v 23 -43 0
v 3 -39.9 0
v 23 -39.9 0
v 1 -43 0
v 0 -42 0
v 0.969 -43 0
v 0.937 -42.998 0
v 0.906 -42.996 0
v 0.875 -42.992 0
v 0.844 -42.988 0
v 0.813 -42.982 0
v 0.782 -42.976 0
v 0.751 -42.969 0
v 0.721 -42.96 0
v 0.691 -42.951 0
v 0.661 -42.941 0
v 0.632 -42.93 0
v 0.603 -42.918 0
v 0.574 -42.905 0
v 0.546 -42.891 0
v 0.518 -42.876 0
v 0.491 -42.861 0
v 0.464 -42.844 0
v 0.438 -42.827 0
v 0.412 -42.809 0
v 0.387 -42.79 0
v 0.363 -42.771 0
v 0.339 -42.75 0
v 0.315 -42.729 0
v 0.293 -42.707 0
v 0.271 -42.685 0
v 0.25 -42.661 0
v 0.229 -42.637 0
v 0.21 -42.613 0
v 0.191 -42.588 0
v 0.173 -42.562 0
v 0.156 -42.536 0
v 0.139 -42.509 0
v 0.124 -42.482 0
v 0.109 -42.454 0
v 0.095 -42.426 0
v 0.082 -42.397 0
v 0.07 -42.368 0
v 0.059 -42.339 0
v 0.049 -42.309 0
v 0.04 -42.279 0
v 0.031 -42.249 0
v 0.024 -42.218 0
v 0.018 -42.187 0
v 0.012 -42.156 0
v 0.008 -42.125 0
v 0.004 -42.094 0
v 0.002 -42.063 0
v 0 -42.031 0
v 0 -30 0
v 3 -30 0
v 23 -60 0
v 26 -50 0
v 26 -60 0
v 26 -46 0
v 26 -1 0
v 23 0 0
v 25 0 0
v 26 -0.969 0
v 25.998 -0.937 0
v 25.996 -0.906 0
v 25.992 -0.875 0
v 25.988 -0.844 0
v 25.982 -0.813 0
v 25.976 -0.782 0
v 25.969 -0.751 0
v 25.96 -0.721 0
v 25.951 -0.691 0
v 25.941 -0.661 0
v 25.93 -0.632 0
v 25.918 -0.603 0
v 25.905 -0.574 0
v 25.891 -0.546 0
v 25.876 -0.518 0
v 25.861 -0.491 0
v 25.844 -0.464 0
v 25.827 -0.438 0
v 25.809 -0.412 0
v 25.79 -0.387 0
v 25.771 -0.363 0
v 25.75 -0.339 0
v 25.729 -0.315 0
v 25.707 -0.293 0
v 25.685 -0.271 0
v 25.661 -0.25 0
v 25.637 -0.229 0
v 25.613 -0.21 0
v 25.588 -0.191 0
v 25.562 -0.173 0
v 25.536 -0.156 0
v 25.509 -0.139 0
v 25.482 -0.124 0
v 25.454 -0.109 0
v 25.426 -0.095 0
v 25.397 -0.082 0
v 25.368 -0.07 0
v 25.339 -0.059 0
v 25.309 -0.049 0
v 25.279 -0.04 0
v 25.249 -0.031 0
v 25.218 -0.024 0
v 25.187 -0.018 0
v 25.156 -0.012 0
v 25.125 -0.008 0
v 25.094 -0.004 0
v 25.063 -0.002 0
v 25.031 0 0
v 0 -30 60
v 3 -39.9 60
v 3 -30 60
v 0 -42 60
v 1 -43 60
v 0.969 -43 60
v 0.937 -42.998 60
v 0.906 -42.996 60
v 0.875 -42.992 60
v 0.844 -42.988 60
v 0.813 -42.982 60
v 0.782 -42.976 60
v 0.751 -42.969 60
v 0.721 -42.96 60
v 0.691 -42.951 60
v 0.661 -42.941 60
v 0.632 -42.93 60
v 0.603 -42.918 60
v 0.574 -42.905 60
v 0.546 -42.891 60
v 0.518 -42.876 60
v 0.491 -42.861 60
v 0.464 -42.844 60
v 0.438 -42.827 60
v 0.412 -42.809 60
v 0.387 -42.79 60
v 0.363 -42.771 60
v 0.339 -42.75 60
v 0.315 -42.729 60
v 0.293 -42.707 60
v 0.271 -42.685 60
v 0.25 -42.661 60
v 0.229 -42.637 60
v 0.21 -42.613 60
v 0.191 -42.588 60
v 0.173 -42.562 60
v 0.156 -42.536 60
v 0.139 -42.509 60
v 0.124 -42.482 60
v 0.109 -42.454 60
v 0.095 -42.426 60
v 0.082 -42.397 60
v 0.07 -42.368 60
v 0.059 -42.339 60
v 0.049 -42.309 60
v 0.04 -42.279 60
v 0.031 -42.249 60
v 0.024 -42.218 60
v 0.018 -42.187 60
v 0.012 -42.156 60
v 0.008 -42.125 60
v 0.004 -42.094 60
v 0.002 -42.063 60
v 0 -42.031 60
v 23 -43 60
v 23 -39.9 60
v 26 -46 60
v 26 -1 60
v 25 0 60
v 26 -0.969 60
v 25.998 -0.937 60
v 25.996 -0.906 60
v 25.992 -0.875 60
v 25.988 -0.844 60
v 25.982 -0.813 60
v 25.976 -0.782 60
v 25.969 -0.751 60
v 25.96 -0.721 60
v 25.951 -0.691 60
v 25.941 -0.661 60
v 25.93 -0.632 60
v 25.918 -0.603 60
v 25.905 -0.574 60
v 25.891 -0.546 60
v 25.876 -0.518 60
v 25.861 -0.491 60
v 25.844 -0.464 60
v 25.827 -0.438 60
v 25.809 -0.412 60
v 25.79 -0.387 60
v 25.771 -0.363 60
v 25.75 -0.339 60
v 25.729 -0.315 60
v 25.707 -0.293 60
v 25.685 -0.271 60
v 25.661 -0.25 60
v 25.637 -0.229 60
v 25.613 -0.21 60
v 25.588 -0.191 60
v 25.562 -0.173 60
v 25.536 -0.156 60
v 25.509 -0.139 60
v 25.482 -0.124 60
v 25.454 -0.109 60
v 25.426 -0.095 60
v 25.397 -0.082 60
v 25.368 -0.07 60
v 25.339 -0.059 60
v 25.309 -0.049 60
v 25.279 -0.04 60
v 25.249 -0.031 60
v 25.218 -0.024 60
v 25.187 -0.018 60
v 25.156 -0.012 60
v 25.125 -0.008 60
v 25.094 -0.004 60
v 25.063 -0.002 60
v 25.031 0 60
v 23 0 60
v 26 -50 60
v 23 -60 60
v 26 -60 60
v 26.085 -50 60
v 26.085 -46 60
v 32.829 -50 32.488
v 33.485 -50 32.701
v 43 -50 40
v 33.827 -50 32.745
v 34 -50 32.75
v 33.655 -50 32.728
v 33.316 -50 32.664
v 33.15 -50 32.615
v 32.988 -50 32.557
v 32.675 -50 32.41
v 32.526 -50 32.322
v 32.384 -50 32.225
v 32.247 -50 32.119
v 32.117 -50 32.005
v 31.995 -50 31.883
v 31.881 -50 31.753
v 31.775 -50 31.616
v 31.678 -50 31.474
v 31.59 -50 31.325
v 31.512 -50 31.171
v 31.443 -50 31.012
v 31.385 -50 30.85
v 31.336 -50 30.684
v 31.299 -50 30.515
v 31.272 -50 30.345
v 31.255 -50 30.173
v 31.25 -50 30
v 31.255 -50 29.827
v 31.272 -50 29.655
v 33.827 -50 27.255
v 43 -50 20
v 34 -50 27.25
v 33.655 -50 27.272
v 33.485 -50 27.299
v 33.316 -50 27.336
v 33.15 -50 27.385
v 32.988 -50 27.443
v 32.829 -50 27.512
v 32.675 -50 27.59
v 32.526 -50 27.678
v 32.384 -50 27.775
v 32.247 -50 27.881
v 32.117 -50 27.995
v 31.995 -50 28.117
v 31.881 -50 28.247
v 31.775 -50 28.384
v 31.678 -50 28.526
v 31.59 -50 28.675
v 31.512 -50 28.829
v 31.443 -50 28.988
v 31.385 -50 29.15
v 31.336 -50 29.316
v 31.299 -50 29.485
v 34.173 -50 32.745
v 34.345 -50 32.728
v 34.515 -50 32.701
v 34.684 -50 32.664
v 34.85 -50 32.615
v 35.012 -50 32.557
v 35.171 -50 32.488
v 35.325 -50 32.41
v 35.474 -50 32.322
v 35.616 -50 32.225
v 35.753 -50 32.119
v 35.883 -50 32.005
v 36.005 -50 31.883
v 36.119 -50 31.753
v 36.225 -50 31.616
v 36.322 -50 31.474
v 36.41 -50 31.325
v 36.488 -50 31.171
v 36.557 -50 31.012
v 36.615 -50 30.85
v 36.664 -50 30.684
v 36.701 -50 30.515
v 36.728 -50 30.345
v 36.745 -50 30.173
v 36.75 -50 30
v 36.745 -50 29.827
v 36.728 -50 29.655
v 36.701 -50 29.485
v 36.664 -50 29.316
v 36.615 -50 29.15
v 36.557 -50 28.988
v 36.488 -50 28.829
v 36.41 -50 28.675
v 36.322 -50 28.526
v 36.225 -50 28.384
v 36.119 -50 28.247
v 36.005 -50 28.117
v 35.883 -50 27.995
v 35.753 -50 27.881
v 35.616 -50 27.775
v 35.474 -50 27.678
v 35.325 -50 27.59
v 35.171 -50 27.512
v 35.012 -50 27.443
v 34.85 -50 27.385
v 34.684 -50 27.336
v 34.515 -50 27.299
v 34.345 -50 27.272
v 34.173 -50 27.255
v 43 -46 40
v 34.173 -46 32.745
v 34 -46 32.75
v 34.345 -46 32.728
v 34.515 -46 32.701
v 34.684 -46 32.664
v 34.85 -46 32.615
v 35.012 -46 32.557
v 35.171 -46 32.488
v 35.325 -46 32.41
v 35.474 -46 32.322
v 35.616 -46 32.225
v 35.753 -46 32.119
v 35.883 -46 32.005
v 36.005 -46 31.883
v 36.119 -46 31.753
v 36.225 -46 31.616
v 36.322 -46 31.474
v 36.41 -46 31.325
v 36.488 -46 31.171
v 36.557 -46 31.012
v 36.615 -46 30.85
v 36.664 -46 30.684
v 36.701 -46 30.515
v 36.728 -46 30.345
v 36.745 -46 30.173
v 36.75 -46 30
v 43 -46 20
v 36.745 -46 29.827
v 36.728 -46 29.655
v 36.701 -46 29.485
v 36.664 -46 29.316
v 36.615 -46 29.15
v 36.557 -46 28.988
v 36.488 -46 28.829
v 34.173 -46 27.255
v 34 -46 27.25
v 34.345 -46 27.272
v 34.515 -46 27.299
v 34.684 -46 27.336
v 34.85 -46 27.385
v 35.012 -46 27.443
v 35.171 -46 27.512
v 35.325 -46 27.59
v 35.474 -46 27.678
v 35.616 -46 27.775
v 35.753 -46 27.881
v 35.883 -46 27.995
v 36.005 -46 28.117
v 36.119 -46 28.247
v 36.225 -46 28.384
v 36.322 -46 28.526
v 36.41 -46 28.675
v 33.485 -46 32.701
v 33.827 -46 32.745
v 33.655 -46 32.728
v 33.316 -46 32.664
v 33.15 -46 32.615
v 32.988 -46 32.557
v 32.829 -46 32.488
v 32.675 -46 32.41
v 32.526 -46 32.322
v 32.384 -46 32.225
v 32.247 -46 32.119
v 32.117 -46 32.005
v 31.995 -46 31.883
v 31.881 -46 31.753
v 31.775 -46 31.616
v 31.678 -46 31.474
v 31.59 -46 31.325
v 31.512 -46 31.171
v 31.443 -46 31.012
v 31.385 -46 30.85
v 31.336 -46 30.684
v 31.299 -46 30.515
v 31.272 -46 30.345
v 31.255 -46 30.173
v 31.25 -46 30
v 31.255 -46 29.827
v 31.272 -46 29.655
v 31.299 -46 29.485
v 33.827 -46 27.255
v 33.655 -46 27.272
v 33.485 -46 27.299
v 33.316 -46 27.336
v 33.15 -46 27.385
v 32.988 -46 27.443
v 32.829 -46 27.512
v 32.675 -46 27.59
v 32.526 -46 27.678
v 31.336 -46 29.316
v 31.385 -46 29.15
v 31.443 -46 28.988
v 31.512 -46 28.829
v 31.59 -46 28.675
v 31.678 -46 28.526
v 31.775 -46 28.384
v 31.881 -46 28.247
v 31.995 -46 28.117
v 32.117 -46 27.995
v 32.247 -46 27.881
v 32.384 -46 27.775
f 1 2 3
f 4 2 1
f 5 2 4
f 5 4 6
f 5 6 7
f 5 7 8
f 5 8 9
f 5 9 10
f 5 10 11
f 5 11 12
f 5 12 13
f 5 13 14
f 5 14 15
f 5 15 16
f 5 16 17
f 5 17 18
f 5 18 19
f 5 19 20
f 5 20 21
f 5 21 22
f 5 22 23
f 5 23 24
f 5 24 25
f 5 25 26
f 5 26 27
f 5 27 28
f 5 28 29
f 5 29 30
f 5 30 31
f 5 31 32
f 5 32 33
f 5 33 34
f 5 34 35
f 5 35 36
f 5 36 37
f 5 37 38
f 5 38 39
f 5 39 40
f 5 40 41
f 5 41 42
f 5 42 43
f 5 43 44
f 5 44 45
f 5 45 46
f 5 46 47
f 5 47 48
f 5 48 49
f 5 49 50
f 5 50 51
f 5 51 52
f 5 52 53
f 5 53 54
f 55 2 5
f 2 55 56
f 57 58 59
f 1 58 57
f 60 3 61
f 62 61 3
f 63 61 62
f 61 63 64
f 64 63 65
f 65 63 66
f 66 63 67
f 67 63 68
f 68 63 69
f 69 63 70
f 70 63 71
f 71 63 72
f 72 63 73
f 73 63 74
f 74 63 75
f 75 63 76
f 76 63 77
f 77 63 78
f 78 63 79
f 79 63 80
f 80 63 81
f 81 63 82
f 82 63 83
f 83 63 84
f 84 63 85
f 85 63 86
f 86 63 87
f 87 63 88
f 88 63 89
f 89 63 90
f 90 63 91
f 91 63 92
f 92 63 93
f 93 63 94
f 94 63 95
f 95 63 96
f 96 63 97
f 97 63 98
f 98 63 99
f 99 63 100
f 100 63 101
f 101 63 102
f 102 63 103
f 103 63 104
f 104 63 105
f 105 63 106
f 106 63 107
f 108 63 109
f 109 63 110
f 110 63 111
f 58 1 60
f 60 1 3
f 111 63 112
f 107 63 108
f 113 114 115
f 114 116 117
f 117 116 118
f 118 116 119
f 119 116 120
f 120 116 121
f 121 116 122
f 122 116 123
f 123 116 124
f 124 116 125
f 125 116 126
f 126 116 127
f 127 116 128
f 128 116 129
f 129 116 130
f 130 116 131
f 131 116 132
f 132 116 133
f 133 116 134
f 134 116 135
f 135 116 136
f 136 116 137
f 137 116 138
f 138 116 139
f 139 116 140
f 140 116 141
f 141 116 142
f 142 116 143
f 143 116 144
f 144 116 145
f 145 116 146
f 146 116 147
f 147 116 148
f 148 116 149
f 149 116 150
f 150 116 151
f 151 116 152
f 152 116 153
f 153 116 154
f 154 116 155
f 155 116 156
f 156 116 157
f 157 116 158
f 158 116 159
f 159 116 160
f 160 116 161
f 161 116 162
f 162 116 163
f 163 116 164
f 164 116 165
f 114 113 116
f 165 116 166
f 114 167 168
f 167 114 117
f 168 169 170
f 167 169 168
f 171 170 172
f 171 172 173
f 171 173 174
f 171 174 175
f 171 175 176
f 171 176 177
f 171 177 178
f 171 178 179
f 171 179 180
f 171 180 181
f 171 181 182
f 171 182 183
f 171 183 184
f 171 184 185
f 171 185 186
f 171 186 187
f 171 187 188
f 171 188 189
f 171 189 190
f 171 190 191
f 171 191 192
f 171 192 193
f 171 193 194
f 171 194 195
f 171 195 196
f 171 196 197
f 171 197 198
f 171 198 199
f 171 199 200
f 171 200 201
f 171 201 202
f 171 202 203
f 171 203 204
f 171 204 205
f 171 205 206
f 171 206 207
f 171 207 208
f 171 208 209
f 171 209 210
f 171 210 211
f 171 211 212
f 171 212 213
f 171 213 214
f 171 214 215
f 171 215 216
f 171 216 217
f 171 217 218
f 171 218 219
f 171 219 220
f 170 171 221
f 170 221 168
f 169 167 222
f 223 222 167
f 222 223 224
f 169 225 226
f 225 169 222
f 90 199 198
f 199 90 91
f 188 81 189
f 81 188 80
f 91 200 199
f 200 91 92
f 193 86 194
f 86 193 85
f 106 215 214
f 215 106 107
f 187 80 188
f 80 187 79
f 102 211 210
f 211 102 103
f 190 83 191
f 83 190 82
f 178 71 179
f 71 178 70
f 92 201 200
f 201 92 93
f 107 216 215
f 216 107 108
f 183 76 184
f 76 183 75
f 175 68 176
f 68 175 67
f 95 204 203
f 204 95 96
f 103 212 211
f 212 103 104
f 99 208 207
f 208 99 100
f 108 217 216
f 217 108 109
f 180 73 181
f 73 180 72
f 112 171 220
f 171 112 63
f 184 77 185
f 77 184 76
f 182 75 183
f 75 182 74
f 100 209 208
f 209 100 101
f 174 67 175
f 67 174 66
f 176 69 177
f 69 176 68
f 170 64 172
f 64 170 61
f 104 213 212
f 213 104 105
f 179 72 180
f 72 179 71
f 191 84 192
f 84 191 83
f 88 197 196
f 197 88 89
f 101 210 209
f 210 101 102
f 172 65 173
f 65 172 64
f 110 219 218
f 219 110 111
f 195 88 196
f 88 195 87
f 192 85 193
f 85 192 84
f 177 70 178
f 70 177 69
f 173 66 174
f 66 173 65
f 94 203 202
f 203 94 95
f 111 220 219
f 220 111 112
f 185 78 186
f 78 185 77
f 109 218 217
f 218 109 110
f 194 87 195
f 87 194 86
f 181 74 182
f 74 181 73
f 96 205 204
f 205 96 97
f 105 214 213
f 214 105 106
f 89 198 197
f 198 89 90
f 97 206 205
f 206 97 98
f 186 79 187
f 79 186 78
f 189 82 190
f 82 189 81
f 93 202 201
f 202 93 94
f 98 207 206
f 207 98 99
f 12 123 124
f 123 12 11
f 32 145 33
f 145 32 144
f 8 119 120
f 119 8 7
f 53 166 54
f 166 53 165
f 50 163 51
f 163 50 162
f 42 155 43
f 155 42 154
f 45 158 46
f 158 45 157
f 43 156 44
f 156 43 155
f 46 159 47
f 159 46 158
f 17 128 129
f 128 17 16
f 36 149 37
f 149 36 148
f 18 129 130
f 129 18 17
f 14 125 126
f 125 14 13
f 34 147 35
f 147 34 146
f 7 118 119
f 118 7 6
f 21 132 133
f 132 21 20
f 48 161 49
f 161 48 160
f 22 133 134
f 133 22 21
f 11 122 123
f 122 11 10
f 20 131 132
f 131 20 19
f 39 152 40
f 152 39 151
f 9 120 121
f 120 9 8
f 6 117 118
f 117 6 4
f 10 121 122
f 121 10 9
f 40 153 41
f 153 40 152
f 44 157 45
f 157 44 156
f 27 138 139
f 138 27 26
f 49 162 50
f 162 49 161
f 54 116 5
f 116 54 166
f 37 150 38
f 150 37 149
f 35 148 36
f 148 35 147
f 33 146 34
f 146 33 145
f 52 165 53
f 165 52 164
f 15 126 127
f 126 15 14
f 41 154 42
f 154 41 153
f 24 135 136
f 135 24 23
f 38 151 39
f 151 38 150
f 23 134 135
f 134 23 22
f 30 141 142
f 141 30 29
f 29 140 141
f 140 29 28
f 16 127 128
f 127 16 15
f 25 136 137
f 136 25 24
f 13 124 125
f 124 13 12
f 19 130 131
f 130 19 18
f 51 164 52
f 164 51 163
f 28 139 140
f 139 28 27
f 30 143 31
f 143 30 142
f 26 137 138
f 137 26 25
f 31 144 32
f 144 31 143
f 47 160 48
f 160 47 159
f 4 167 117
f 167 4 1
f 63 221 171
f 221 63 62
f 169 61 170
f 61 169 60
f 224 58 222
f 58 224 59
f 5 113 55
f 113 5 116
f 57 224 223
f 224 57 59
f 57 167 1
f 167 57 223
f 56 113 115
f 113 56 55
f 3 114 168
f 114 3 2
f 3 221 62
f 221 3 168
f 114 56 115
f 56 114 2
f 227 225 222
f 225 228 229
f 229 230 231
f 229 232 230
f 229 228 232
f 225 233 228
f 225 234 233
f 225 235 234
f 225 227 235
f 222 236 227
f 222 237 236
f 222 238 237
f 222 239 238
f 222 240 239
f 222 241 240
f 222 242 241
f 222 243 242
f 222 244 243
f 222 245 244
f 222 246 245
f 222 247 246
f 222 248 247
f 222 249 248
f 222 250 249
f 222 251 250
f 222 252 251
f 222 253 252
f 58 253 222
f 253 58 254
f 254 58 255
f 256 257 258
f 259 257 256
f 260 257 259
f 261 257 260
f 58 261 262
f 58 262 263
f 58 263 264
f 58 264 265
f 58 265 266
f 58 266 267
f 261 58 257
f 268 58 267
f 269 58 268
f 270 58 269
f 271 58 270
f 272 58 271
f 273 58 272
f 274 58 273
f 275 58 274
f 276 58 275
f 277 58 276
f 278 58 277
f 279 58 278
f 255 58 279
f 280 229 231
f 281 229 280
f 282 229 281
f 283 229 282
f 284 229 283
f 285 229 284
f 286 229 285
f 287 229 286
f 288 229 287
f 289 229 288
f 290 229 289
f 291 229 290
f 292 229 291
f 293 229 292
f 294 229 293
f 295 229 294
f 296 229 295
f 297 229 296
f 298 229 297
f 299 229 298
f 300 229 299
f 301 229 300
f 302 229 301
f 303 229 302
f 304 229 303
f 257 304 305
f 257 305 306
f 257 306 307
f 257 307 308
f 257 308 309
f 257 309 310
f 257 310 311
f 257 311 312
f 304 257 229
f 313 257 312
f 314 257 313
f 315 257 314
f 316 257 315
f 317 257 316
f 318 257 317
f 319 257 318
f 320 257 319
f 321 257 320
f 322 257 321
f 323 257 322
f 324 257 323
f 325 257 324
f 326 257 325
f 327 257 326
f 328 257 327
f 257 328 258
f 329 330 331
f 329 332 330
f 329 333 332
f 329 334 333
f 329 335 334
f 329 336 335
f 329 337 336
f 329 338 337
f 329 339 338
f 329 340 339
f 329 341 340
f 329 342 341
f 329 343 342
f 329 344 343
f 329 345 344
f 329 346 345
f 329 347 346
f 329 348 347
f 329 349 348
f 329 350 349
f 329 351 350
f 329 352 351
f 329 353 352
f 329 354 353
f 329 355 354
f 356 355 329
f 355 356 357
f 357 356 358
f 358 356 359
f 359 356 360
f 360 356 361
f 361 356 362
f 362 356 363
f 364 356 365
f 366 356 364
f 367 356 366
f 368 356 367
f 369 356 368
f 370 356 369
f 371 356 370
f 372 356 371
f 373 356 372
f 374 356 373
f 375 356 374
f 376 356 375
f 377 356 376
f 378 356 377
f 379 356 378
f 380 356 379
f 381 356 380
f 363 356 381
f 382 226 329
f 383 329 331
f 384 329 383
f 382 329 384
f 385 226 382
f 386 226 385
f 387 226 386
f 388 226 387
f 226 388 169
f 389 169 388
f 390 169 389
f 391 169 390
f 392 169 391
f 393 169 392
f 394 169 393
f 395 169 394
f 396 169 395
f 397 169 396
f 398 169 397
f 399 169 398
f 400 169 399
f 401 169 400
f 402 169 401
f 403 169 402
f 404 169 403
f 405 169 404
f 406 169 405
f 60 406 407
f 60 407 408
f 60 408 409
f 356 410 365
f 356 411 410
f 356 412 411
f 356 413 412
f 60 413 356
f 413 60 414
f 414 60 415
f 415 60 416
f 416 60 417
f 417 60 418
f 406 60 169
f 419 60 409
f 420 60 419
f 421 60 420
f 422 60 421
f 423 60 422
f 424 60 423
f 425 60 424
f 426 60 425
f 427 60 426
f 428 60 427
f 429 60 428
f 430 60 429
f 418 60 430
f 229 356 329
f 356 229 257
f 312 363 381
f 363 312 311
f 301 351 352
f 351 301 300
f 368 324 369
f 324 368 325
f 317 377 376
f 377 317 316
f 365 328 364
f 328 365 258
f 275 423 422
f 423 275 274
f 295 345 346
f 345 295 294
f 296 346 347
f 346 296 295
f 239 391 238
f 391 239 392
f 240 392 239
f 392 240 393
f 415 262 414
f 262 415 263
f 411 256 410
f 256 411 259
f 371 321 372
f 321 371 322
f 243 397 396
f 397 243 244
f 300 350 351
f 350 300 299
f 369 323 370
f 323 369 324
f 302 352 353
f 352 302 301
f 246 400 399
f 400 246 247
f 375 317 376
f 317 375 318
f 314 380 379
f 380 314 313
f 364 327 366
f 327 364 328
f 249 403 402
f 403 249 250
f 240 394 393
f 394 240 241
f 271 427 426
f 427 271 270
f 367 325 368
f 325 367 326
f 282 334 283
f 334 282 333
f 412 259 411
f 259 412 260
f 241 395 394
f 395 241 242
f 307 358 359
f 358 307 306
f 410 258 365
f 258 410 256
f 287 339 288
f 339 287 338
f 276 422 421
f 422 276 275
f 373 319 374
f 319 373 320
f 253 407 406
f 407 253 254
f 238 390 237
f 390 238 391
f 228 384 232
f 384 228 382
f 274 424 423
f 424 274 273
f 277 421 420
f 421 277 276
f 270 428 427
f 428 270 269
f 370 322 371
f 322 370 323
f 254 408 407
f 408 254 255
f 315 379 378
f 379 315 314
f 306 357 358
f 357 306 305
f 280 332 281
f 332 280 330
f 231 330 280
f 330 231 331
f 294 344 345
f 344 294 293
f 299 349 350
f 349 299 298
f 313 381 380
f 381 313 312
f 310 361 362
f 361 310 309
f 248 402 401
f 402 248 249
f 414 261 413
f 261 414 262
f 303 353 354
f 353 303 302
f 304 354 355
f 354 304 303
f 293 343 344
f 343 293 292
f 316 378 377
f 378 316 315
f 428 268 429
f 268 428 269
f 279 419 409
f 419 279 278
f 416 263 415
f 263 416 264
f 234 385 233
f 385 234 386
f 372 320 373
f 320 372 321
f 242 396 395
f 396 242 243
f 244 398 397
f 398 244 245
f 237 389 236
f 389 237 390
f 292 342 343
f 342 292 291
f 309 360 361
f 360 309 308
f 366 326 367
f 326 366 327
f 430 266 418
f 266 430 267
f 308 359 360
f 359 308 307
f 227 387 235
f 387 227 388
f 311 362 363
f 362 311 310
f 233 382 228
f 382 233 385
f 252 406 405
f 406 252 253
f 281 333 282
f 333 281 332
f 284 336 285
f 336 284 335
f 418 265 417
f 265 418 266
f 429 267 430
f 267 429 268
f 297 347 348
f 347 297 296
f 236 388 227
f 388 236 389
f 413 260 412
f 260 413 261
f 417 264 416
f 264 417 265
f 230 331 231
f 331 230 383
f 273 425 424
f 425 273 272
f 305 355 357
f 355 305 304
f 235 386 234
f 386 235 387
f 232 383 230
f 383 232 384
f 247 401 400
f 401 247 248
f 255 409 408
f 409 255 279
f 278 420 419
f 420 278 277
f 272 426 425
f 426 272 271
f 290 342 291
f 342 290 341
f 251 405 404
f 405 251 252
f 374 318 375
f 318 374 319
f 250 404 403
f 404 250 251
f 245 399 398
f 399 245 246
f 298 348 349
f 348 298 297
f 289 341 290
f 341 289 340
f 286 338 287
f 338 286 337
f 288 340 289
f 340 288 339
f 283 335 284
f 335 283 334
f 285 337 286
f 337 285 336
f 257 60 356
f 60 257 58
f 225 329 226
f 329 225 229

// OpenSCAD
// file: ../sc.scad
// ShortCuts.scad 
// Autor: Rudolf Huttary, Berlin 2015
//
$fn = 100; 

//show_examples(); 

module show_examples()
	place_in_rect(30, 30)
	{
		Cy(h = 10); 
		CyH(h = 10); 
		CyH(h = 10, w = 30); 
		CyS(h = 10); 
		CyS(h = 10, w1 = 25, w2 = 75); 
		Cu(10); 
		Ri(h = 10); 
		RiH(h = 10); 
		RiS(h = 10, w1 = 10); 
		RiS(h = 10, w1 = 30, w2 = 300); 
		Sp(); 
		SpH(10, 30, 30); 
	}


module help()
{
echo("==============="); 
echo("help(): shows this help"); 
echo("show_examples(): shows some examples"); 
echo("place_in_rect(): places children objects in grid"); 
echo("Transformations:"); 
echo(" transform :  T(x=0, y=0, z=0), Tx(x=0) , Ty(y=0), Tz(z=0)"); 
echo(" rotate :  R(x=0, y=0, z=0), Rx(x=0) , Ry(y=0), Rz(z=0)"); 
echo(" scale :  S(x=1, y=1, z=1), Sx(x=1) , Sy(y=1), Sz(z=1)"); 
echo("Logical"); 
echo(" difference :  D()"); 
echo(" union :  U()"); 
echo(" intersection : *missing*"); 
echo("Primitives"); 
echo(" circle :  Ci(r=10)"); 
echo(" circle_half :  CiH(r=10, w=0)")
echo(" circle_segment :  CiS(r=10, w1=0, w2=90)")
echo(" square :  Sq(x=10, y=0, center=true))"); 
echo(" cylinder :  Cy(r=10, h=1, center=true)"); 
echo(" cylinder_half :  CyH(r=10, w=0)")
echo(" cylinder_segment: CyS(r=10, h=1, w1=0, w2=90,center=true)"); 
echo(" cylinder_segment: Pie(r=10, h=1, w1=0, w2=90,center=true)"); 
echo(" cube :  Cu(x=10, y=0, z=10, center=true)"); 
echo(" ring :  Ri(R=10, r=5, h=1, center=true)"); 
echo(" ring_half :  RiH(R=10, r=5, h=1, w=0 center=true)"); 
echo(" ring_segment :  RiS(R=10, r=5, h=1, w1=0, w2=90, center=true)"); 
echo(" sphere:  Sp(r=10))"); 
echo(" sphere_half:  SpH(r=10, w1 = 0, w2 = 0))"); 
echo("==============="); 
}

// Euclidean Transformations
module T(x=0, y=0, z=0){translate([x, y, z])children(); }
module Tx(x) { translate([x, 0, 0])children(); }
module Ty(y) { translate([0, y, 0])children(); }
module Tz(z) { translate([0, 0, z])children(); }

module R(x=0, y=0, z=0){rotate([x, y, z]) children();}
module Rx(x=90){rotate([x, 0, 0]) children();}
module Ry(y=90){rotate([0, y, 0]) children();}
module Rz(z=90){rotate([0, 0, z]) children();}

module M(x=0, y=0, z=0){mirror([x, y, z]) children();}
module Mx(x=1){mirror([x, 0, 0]) children();}
module My(y=1){mirror([0, y, 0]) children();}
module Mz(z=1){mirror([0, 0, z]) children();}

module S(x=1, y=1, z=1){scale([x, y, z]) children();}
module Sx(x=1){scale([x, 1, 1]) children();}
module Sy(y=1){scale([1, y, 1]) children();}
module Sz(z=1){scale([1, 1, z]) children();}

module D() difference(){children(0); children([1:$children-1]);}
module U() children([0:$children-1]);
// module I() intersection()children([0:$children-1]); // does not work for some reason


// primitives - 2D

module Sq(x =10, y = 0, center = false)
{
   if(y==0)
		square([x, x], center = center); 
	else
		square([x, y], center = center); 
}
module Ci(r = 10)
{
	circle(r = r); 
}

// derived primitives - 2d
module CiH(r = 10, w = 0)
  circle_half(r, w); 

module CiS(r = 10, w1 = 0, w2 = 90)
  circle_segment(r, w1, w2); 


// primitives - 3d
module Cy(r = 10, h = 1, center = false)
{
	cylinder(r = r, h = h, center = center); 
}
module Cu(x = 10, y = 0, z = 10, center = false)
{
  if (y==0)
	cube([x, x, x], center = center); 
  else
	cube([x, y, z], center = center); 
}

// derived primitives - 3d
module CyH(r = 10, h = 1, w = 0, center = false)
  cylinder_half(r, h, w, center); 

module CyS(r = 10, h = 1, w1 = 0, w2 = 90, center = false)
  cylinder_segment(r, h, w1, w2, center); 

module Ri(R = 10, r = 5, h = 1, center = false)
  ring(R, r, h, center); 

module RiS(R = 10, r = 5, h = 1, w1 = 0, w2 = 90, center = false)
   ring_segment(R, r, h, w1, w2, center); 

module RiH(r1 = 10, r2, h = 1, w = 0, center = false)
   ring_half(r1, r2, h, w, center); 
module Pie(r = 10, h = 1, w1 = 0, w2 = 90, center = false)
  cylinder_segment(r, h, w1, w2, center);  
module Sp(r = 10)
  sphere(r); 
module SpH(r = 10, w1 = 0, w2 = 0)
  sphere_half(r, w1, w2); 
module SpS(r = 10, w1 = 0, w2 = 90, w3 = 90)
  sphere_segment(r, w1, w2); 




// clear text definitions
module circle_half(r = 10, w = 0)
{
	difference()
	{
		circle(r); 
     rotate([0, 0, w-90])
     translate([0, -r])
		square([r, 2*r], center = false); 
	}
}

module circle_segment(r = 10, w1 = 0, w2 = 90)
{
  W2 = (w1>w2)?w2+360:w2; 
  if (W2-w1 < 180)
    intersection()
		{
       circle_half(r, w1); 
       circle_half(r, W2-180); 
 		}
	else
    union()
		{
       circle_half(r, w1); 
       circle_half(r, W2-180); 
 		}
}

module cylinder_half(r = 10, h = 1, w = 0, center = true)
{
  linear_extrude(height = h, center = center)
  circle_half(r, w); 
} 

module cylinder_segment(r = 10, h = 1, w1 = 0, w2 = 90, center = true)
{
  linear_extrude(height = h, center = center)
  circle_segment(r, w1, w2); 
} 

module ring(R = 10, r = 5, h = 1, center = true)
{
	difference()
	{
	cylinder(r = R, h = h, center = center); 
   translate([0, 0, -2*h])
	cylinder(r = r, h = 4*h, center = false); 
	}
}

module ring_half(R = 10, r = 5, h = 1, w = 0, center = true)
{
	difference()
	{
		ring(R, r, h, center); 
     rotate([0, 0, w])
     translate([0, -R/2, 0])
		cube([2*R, R, 3*h], center = true); 
	}
}

module ring_segment(R = 10, r = 5, h = 1, w1 = 0, w2 = 90, center = true)
{
  W2 = (w1>w2)?w2+360:w2; 
  if (W2-w1 < 180)
    intersection()
		{
       ring_half(R, r, h, w1, center); 
       ring_half(R, r, h, W2-180, center); 
 		}
	else
    union()
		{
       ring_half(R, r, h, w1, center); 
       ring_half(R, r, h, W2-180, center); 
 		}
}


module sphere_half(r = 10, w1 = 0, w2 = 0)
{  
	difference()
	{
   	sphere(r); 
      rotate([-w1, -w2, 0])
     	translate([0, 0, r])
		cube([2*r, 2*r, r], center = true); 
	}

}


// additional code
module place_in_rect(dx =20, dy=20)
{
  cols = ceil(sqrt($children)); 
  rows = floor(sqrt($children)); 
  for(i = [0:$children-1])
	{ 
	  T(dx*(-cols/2+(i%cols)+.5), dy*(rows/2-floor(i/cols)-.5))
		 children(i); 
	}
}
// main file
use <../lib.scad>
$fn= 100;

x=60;
t=3;
tf=4;   // thick to fix to frame
h=40;
ct=20;  // cell thickness
f=10;   // front
sup_pos=10;

//rotate([0,90,0])
rotate([0,0,-90])
{
    difference(){
        union(){
            rcube(h+t,ct+t*2,x,1);
            
            translate([t,ct+t,0])
            cube([h+sup_pos-t+10,t,x]);
        }
        
        translate([-f,-t,-.1])
        cube([h,ct,x+1]);

        translate([-.1,t,-.1])
        cube([h,ct,x+1]);
    }
    // Support
    difference(){
        translate([h+sup_pos-tf, ct+t, 0])
        cube([tf,20,x]);

        // Hole
        translate([0, ct+tf+10, x/2])
        rotate([0,90,0])
        cylinder(d=5.5, h=h+sup_pos+1);
        
        // Chamfer
        hull(){
            translate([0, ct+t*2, -.1])
            cube([h+sup_pos+1,20,.1]);
            translate([0, ct+t+20, 0])
            cube([h+sup_pos+1,.1,20]);
        }
        hull(){
            translate([0, ct+t*2, x+.1])
            cube([h+sup_pos+1,20,.1]);
            translate([0, ct+t+20, x-20])
            cube([h+sup_pos+1,.1,20]);
        }
    }
}
